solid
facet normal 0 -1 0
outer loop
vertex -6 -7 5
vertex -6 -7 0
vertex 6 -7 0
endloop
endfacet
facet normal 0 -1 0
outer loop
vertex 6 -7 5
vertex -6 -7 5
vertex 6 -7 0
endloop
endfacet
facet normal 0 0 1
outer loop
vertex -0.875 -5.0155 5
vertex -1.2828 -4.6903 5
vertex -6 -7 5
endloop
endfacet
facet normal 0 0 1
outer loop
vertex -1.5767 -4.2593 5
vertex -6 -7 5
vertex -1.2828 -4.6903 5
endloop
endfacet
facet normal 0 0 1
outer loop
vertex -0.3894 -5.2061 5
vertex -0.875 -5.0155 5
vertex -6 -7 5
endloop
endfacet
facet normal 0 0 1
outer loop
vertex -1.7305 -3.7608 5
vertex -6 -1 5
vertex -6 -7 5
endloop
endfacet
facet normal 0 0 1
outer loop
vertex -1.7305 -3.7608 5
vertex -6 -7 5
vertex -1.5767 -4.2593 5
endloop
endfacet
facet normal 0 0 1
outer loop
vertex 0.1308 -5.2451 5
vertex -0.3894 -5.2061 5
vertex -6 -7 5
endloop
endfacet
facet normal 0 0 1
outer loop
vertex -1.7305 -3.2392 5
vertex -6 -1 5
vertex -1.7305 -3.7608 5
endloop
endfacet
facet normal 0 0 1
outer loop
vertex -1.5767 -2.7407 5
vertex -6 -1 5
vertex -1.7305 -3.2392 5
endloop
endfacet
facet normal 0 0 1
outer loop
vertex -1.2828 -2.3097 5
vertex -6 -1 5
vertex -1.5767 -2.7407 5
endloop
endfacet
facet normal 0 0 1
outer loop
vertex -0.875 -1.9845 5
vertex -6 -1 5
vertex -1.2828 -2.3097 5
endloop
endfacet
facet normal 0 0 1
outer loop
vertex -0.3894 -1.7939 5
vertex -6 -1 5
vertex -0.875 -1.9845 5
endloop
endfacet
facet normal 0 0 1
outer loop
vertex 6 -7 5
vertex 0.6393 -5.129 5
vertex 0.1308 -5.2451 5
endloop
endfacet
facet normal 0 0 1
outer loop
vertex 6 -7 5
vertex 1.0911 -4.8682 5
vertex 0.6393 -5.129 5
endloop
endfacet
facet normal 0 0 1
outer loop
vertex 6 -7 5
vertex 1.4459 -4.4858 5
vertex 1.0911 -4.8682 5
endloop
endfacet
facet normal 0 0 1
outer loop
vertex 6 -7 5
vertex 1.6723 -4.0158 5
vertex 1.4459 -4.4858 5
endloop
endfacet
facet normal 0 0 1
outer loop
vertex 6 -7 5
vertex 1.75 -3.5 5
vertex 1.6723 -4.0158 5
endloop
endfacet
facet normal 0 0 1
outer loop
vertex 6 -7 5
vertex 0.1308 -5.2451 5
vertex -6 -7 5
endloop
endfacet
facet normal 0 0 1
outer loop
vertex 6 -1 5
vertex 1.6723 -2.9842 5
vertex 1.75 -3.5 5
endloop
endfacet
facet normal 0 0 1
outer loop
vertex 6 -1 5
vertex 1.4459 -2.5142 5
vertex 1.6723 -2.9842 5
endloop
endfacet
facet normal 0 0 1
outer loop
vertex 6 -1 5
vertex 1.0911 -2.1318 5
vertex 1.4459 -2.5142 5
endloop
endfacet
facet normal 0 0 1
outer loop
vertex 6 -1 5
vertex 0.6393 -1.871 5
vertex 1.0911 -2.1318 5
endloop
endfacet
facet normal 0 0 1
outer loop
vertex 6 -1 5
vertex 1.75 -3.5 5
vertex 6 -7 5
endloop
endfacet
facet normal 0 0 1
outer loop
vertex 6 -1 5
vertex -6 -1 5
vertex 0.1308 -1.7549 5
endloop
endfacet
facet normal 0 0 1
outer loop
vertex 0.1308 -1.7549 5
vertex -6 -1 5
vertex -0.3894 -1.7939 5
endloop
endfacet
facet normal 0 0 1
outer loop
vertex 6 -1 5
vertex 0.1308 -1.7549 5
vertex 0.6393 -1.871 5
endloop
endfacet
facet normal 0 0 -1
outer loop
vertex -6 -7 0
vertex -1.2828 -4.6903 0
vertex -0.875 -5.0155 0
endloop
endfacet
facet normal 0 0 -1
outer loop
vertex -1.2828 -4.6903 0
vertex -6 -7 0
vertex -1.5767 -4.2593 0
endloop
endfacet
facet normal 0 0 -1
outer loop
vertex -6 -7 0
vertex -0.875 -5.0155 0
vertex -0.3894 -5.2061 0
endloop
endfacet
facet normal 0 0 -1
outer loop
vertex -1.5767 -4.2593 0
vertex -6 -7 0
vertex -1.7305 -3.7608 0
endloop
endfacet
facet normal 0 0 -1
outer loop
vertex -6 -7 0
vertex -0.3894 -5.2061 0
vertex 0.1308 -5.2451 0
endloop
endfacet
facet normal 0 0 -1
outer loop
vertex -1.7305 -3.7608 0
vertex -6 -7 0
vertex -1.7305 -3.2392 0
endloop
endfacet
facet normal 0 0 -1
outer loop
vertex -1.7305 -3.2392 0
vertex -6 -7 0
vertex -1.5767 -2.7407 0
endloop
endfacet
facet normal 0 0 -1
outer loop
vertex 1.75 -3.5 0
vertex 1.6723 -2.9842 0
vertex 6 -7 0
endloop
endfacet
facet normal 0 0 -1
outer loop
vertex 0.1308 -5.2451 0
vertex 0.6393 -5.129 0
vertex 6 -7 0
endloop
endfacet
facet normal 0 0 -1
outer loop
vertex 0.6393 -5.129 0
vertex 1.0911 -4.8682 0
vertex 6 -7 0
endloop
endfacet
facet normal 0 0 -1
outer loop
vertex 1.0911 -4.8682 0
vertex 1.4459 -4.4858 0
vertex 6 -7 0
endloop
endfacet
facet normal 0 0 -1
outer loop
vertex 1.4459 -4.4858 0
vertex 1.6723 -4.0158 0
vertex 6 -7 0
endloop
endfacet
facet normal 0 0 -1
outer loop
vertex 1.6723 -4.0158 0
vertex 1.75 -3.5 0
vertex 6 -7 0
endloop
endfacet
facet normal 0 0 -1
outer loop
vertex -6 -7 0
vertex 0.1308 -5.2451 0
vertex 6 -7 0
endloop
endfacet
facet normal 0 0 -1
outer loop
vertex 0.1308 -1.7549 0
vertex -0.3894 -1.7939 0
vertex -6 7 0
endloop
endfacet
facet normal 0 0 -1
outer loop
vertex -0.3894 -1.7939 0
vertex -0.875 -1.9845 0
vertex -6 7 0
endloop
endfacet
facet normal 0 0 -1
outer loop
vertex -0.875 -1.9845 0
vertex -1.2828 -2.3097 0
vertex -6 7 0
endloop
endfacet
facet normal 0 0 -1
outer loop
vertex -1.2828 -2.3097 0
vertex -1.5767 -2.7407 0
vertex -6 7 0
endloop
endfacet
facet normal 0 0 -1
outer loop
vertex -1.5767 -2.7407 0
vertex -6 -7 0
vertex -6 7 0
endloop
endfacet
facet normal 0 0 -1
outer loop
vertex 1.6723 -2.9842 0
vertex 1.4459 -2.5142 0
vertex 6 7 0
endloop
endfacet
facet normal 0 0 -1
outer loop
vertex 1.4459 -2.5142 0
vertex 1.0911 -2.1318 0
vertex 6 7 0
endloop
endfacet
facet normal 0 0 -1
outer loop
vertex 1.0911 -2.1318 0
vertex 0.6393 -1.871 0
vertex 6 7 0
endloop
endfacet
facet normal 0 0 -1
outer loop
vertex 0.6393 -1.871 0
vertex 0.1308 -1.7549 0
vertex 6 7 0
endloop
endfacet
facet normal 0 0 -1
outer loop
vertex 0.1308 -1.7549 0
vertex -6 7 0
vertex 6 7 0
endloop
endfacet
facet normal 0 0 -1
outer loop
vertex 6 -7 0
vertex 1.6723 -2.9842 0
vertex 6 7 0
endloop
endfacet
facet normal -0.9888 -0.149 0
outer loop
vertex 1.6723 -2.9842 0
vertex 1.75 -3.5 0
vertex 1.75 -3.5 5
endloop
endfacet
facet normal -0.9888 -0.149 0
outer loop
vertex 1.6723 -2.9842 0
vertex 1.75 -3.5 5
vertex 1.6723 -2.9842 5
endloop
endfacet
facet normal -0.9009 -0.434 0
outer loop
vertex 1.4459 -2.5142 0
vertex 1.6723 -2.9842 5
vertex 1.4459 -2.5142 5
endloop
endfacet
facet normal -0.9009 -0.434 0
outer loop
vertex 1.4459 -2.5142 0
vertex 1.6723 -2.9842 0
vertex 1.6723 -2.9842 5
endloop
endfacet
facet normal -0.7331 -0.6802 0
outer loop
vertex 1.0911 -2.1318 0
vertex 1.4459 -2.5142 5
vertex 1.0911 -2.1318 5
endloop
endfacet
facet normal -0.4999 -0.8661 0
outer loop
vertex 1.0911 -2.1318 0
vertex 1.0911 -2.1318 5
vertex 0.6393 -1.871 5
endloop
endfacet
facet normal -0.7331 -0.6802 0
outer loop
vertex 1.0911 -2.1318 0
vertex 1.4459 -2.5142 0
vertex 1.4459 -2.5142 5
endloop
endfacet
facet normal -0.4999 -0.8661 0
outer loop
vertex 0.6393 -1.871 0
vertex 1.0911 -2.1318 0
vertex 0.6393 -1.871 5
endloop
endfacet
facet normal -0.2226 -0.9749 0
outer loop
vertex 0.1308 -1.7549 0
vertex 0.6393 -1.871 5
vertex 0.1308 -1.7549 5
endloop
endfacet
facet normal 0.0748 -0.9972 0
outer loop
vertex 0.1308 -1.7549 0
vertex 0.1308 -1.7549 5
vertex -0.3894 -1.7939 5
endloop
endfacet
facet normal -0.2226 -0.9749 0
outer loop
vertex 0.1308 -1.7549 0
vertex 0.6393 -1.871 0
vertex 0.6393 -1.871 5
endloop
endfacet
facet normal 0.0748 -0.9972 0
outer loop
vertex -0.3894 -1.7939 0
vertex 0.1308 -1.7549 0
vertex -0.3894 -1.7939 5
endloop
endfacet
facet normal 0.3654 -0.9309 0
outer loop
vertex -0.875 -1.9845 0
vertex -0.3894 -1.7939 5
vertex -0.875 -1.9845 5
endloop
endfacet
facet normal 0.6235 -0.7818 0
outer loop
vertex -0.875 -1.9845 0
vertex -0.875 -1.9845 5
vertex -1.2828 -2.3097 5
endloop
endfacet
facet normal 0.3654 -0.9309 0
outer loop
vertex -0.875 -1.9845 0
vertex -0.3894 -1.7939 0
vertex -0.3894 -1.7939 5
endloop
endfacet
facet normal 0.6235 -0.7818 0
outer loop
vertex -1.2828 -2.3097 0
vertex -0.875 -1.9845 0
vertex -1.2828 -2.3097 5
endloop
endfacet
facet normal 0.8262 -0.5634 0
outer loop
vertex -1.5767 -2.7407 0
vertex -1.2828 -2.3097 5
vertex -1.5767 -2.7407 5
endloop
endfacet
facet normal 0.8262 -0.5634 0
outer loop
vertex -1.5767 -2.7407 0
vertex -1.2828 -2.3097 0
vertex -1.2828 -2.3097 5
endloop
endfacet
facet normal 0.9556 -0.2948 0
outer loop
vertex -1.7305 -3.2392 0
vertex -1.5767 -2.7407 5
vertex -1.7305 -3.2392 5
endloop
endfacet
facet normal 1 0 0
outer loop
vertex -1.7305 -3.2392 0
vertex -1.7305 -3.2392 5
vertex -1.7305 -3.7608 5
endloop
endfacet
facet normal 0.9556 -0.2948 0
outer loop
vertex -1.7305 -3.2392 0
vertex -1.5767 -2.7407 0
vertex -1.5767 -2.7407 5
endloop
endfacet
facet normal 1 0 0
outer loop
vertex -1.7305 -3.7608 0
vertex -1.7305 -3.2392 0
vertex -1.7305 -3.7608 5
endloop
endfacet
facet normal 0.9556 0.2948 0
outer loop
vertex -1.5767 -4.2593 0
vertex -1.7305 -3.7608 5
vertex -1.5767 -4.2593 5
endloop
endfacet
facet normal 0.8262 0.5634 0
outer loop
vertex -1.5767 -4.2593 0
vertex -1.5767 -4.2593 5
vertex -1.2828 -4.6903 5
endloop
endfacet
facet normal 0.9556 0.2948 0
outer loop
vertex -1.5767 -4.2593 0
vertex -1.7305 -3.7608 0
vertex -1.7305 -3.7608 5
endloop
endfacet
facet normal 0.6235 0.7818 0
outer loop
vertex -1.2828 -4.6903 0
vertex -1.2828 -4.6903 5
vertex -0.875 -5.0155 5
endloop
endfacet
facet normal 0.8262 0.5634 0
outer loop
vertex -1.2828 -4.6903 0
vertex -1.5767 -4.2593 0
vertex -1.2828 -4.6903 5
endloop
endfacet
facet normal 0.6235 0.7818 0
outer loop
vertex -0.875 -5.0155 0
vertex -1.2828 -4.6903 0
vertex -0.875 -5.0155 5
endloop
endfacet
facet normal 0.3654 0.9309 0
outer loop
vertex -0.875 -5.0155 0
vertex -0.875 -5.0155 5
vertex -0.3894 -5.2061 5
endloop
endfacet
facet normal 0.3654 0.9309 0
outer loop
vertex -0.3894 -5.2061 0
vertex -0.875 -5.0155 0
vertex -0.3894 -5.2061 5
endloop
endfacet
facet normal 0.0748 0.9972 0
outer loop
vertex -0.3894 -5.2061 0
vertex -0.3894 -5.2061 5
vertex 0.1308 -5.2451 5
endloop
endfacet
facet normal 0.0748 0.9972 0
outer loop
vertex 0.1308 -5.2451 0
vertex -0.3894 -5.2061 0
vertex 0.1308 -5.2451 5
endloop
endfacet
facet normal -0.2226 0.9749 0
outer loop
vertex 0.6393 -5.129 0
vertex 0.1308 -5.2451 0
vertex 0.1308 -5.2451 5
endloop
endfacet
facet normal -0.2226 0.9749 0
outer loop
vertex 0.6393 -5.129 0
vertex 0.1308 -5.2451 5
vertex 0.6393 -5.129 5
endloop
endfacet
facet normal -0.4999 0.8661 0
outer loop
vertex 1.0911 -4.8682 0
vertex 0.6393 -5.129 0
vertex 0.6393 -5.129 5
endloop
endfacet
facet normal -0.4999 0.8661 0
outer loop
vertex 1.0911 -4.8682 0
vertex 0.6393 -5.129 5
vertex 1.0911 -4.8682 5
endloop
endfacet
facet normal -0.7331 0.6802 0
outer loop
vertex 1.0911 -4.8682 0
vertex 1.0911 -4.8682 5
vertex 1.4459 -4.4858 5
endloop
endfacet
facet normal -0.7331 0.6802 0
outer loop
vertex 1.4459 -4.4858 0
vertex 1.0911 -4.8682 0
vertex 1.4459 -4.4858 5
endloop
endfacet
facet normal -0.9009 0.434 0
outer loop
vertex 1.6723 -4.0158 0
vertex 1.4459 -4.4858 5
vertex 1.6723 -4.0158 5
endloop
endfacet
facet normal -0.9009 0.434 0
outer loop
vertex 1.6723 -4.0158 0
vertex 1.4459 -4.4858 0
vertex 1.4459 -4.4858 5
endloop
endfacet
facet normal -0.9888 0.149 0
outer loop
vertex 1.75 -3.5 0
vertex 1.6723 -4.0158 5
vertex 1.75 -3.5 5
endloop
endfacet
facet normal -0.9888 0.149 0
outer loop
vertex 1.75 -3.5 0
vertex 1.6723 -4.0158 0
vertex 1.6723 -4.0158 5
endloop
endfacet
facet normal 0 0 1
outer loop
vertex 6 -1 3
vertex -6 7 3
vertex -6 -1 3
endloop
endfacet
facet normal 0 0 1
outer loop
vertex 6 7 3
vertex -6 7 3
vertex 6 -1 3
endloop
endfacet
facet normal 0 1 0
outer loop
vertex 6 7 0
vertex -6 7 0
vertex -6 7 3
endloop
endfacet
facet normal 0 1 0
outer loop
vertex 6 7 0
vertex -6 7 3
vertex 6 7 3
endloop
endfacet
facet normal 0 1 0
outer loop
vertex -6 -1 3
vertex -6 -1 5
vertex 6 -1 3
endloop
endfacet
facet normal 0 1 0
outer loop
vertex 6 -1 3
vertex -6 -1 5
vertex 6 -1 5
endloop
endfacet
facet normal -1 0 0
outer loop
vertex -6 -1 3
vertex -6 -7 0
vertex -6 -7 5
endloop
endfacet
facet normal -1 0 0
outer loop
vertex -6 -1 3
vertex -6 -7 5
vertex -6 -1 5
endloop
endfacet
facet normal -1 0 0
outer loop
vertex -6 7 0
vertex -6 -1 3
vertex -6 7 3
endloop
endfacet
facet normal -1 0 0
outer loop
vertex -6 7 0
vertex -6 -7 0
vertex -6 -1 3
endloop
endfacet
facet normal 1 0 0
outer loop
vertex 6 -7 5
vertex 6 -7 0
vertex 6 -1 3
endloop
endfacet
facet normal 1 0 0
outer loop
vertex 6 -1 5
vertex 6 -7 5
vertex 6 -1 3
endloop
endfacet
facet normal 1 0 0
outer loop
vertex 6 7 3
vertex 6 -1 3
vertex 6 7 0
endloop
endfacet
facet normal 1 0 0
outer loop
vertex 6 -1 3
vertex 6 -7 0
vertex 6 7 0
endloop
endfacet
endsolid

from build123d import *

# Parameters (mm, degrees)
SKETCH_1_W          = 12
SKETCH_1_H          = 14
SKETCH_1_R          = 1.75
EXTRUDE_1_DEPTH     = 5
SKETCH_2_W          = 16.082841594
SKETCH_2_H          = 10
CUT_EXTRUDE_1_DEPTH = 2


with BuildPart() as part:
    # Эскиз1 → Вытянуть1 (new body)
    with BuildSketch(Plane.XY):
        Rectangle(SKETCH_1_W, SKETCH_1_H)
        with Locations((0, -3.5)):
            Circle(SKETCH_1_R, mode=Mode.SUBTRACT)
    extrude(amount=EXTRUDE_1_DEPTH)

    # Эскиз2 → Вырез-Вытянуть1 (cut)
    with BuildSketch(Plane.XY.offset(5)):
        with Locations((-0.230919178, 4)):
            Rectangle(SKETCH_2_W, SKETCH_2_H)
    extrude(amount=-CUT_EXTRUDE_1_DEPTH, mode=Mode.SUBTRACT)


solid = part.part
